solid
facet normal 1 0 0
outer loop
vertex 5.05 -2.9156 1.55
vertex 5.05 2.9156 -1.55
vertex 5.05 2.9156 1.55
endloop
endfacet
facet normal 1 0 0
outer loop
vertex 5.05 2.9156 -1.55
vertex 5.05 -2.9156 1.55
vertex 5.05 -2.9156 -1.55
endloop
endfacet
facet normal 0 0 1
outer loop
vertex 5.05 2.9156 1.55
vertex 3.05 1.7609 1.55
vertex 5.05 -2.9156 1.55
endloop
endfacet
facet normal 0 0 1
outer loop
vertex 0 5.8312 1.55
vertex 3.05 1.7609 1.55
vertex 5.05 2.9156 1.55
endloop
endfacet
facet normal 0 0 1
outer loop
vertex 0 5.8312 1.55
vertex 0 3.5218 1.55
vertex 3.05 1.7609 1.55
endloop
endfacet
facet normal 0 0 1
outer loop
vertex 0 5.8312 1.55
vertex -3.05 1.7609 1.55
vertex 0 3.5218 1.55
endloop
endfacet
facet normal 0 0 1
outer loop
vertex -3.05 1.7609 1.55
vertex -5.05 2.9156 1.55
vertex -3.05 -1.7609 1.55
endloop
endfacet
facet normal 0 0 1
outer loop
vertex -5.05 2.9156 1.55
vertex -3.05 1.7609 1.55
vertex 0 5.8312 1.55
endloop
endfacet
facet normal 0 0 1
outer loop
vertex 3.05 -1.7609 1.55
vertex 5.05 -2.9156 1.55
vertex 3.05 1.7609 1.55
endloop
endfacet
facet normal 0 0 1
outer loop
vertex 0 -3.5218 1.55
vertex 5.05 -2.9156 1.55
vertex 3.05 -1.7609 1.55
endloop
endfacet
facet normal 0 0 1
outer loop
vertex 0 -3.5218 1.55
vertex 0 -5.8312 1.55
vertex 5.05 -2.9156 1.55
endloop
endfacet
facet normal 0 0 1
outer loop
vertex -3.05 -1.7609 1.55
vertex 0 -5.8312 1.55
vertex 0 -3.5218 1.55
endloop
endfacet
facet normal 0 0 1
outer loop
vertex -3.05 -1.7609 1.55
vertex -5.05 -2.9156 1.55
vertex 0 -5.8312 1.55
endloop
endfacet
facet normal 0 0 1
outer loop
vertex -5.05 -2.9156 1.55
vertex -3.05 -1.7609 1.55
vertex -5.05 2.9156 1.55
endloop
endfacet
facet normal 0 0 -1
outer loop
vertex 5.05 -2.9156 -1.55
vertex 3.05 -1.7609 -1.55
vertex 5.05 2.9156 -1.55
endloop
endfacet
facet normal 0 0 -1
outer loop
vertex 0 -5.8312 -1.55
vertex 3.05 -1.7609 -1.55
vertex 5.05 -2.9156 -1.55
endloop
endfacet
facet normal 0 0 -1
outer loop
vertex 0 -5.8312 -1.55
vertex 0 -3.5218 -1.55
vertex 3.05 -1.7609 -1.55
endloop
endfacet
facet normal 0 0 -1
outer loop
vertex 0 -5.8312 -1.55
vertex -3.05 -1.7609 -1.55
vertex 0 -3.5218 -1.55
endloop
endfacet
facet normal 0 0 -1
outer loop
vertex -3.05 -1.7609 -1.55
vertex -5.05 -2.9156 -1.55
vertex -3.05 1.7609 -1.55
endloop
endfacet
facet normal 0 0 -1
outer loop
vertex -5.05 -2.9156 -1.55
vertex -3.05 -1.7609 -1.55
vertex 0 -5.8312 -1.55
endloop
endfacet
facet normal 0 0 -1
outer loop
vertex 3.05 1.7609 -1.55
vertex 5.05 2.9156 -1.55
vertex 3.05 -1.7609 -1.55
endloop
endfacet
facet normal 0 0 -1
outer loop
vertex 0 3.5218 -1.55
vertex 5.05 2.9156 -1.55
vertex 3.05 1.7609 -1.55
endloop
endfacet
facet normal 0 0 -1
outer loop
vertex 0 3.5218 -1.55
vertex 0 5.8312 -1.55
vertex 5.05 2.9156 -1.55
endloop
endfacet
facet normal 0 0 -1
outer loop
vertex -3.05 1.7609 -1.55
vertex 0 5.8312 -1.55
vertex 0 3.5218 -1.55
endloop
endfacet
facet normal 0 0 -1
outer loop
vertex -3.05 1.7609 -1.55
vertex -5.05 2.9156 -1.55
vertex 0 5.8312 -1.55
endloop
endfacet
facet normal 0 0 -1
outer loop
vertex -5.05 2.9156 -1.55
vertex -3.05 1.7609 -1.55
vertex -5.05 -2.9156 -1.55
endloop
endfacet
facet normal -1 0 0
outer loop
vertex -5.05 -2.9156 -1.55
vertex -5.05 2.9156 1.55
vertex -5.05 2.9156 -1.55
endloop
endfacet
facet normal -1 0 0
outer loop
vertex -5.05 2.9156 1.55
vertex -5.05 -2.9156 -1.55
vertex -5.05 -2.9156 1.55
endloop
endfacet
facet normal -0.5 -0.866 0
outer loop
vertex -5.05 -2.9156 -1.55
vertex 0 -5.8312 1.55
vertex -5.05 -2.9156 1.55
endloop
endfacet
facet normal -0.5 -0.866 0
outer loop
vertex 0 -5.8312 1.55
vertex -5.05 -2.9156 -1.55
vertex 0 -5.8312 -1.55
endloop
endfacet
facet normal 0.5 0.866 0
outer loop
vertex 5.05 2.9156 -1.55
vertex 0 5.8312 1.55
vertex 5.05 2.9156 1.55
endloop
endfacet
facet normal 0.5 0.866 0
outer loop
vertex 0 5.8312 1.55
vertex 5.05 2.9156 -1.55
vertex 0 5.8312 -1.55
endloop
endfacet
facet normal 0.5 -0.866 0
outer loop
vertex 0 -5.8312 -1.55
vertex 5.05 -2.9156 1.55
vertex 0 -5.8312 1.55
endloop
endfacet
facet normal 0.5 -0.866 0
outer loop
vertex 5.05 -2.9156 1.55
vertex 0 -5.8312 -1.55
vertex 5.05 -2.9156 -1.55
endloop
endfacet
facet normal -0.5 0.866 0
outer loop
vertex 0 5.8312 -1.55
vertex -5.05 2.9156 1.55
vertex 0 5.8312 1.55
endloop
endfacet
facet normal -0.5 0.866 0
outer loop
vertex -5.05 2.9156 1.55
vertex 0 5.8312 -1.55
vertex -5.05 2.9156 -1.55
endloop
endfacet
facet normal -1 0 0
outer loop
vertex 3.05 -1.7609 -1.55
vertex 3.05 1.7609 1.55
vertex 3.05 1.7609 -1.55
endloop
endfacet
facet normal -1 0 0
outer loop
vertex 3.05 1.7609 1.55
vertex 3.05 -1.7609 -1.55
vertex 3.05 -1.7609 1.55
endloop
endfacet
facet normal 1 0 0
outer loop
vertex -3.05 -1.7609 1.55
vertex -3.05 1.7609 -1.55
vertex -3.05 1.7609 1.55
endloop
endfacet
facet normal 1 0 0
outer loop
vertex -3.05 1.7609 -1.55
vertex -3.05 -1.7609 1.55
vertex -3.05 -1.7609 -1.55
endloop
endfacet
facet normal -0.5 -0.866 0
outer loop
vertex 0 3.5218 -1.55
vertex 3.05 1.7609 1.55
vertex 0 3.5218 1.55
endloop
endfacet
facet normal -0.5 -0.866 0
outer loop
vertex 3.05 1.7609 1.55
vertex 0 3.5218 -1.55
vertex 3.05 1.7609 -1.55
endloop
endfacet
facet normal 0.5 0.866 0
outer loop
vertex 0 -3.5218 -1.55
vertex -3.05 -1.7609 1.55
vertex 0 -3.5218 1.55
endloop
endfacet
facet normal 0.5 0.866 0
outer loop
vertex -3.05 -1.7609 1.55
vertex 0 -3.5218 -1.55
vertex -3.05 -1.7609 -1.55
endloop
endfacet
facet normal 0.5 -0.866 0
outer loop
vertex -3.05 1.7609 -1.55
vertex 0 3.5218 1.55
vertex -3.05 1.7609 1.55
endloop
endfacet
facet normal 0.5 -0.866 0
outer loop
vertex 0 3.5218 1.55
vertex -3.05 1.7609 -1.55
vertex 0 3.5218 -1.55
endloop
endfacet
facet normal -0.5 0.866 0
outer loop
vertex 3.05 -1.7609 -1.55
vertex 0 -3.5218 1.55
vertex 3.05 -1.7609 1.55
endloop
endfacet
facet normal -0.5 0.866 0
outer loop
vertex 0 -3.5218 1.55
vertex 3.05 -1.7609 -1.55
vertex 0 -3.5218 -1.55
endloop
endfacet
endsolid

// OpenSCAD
// file: ../../lib/nut/nut_hexagonal.scad
//nut_M(3,1,0.1);
//nut_M(6,1,0.1);
//nut_M_border(6,10,3,0.1);

module nut_M(size,height,clear)
{
    nut_hexagonal(size,height,clear);
}

module nut_M_border(size,radius,height,clear)
{
    difference() {
        //cylinder(r=radius, h=height,center=true);
        nut_hexagonal(radius,height,clear);
        nut_hexagonal(size,height,clear);
    }
}

module nut_hexagonal(radius,height,clear)
{
    height = height+clear;
	radius = radius+clear;
    angle = 360/6;
	cote = (radius)/tan(angle);

	union()
    {
		rotate([0,0,0])
			cube([radius,cote,height],center=true);
		rotate([0,0,angle])
			cube([radius,cote,height],center=true);
		rotate([0,0,2*angle])
			cube([radius,cote,height],center=true);
	}
}
// main file
include <../../lib/nut/nut_hexagonal.scad>;

nut_M_border(6,10,3,0.1);
